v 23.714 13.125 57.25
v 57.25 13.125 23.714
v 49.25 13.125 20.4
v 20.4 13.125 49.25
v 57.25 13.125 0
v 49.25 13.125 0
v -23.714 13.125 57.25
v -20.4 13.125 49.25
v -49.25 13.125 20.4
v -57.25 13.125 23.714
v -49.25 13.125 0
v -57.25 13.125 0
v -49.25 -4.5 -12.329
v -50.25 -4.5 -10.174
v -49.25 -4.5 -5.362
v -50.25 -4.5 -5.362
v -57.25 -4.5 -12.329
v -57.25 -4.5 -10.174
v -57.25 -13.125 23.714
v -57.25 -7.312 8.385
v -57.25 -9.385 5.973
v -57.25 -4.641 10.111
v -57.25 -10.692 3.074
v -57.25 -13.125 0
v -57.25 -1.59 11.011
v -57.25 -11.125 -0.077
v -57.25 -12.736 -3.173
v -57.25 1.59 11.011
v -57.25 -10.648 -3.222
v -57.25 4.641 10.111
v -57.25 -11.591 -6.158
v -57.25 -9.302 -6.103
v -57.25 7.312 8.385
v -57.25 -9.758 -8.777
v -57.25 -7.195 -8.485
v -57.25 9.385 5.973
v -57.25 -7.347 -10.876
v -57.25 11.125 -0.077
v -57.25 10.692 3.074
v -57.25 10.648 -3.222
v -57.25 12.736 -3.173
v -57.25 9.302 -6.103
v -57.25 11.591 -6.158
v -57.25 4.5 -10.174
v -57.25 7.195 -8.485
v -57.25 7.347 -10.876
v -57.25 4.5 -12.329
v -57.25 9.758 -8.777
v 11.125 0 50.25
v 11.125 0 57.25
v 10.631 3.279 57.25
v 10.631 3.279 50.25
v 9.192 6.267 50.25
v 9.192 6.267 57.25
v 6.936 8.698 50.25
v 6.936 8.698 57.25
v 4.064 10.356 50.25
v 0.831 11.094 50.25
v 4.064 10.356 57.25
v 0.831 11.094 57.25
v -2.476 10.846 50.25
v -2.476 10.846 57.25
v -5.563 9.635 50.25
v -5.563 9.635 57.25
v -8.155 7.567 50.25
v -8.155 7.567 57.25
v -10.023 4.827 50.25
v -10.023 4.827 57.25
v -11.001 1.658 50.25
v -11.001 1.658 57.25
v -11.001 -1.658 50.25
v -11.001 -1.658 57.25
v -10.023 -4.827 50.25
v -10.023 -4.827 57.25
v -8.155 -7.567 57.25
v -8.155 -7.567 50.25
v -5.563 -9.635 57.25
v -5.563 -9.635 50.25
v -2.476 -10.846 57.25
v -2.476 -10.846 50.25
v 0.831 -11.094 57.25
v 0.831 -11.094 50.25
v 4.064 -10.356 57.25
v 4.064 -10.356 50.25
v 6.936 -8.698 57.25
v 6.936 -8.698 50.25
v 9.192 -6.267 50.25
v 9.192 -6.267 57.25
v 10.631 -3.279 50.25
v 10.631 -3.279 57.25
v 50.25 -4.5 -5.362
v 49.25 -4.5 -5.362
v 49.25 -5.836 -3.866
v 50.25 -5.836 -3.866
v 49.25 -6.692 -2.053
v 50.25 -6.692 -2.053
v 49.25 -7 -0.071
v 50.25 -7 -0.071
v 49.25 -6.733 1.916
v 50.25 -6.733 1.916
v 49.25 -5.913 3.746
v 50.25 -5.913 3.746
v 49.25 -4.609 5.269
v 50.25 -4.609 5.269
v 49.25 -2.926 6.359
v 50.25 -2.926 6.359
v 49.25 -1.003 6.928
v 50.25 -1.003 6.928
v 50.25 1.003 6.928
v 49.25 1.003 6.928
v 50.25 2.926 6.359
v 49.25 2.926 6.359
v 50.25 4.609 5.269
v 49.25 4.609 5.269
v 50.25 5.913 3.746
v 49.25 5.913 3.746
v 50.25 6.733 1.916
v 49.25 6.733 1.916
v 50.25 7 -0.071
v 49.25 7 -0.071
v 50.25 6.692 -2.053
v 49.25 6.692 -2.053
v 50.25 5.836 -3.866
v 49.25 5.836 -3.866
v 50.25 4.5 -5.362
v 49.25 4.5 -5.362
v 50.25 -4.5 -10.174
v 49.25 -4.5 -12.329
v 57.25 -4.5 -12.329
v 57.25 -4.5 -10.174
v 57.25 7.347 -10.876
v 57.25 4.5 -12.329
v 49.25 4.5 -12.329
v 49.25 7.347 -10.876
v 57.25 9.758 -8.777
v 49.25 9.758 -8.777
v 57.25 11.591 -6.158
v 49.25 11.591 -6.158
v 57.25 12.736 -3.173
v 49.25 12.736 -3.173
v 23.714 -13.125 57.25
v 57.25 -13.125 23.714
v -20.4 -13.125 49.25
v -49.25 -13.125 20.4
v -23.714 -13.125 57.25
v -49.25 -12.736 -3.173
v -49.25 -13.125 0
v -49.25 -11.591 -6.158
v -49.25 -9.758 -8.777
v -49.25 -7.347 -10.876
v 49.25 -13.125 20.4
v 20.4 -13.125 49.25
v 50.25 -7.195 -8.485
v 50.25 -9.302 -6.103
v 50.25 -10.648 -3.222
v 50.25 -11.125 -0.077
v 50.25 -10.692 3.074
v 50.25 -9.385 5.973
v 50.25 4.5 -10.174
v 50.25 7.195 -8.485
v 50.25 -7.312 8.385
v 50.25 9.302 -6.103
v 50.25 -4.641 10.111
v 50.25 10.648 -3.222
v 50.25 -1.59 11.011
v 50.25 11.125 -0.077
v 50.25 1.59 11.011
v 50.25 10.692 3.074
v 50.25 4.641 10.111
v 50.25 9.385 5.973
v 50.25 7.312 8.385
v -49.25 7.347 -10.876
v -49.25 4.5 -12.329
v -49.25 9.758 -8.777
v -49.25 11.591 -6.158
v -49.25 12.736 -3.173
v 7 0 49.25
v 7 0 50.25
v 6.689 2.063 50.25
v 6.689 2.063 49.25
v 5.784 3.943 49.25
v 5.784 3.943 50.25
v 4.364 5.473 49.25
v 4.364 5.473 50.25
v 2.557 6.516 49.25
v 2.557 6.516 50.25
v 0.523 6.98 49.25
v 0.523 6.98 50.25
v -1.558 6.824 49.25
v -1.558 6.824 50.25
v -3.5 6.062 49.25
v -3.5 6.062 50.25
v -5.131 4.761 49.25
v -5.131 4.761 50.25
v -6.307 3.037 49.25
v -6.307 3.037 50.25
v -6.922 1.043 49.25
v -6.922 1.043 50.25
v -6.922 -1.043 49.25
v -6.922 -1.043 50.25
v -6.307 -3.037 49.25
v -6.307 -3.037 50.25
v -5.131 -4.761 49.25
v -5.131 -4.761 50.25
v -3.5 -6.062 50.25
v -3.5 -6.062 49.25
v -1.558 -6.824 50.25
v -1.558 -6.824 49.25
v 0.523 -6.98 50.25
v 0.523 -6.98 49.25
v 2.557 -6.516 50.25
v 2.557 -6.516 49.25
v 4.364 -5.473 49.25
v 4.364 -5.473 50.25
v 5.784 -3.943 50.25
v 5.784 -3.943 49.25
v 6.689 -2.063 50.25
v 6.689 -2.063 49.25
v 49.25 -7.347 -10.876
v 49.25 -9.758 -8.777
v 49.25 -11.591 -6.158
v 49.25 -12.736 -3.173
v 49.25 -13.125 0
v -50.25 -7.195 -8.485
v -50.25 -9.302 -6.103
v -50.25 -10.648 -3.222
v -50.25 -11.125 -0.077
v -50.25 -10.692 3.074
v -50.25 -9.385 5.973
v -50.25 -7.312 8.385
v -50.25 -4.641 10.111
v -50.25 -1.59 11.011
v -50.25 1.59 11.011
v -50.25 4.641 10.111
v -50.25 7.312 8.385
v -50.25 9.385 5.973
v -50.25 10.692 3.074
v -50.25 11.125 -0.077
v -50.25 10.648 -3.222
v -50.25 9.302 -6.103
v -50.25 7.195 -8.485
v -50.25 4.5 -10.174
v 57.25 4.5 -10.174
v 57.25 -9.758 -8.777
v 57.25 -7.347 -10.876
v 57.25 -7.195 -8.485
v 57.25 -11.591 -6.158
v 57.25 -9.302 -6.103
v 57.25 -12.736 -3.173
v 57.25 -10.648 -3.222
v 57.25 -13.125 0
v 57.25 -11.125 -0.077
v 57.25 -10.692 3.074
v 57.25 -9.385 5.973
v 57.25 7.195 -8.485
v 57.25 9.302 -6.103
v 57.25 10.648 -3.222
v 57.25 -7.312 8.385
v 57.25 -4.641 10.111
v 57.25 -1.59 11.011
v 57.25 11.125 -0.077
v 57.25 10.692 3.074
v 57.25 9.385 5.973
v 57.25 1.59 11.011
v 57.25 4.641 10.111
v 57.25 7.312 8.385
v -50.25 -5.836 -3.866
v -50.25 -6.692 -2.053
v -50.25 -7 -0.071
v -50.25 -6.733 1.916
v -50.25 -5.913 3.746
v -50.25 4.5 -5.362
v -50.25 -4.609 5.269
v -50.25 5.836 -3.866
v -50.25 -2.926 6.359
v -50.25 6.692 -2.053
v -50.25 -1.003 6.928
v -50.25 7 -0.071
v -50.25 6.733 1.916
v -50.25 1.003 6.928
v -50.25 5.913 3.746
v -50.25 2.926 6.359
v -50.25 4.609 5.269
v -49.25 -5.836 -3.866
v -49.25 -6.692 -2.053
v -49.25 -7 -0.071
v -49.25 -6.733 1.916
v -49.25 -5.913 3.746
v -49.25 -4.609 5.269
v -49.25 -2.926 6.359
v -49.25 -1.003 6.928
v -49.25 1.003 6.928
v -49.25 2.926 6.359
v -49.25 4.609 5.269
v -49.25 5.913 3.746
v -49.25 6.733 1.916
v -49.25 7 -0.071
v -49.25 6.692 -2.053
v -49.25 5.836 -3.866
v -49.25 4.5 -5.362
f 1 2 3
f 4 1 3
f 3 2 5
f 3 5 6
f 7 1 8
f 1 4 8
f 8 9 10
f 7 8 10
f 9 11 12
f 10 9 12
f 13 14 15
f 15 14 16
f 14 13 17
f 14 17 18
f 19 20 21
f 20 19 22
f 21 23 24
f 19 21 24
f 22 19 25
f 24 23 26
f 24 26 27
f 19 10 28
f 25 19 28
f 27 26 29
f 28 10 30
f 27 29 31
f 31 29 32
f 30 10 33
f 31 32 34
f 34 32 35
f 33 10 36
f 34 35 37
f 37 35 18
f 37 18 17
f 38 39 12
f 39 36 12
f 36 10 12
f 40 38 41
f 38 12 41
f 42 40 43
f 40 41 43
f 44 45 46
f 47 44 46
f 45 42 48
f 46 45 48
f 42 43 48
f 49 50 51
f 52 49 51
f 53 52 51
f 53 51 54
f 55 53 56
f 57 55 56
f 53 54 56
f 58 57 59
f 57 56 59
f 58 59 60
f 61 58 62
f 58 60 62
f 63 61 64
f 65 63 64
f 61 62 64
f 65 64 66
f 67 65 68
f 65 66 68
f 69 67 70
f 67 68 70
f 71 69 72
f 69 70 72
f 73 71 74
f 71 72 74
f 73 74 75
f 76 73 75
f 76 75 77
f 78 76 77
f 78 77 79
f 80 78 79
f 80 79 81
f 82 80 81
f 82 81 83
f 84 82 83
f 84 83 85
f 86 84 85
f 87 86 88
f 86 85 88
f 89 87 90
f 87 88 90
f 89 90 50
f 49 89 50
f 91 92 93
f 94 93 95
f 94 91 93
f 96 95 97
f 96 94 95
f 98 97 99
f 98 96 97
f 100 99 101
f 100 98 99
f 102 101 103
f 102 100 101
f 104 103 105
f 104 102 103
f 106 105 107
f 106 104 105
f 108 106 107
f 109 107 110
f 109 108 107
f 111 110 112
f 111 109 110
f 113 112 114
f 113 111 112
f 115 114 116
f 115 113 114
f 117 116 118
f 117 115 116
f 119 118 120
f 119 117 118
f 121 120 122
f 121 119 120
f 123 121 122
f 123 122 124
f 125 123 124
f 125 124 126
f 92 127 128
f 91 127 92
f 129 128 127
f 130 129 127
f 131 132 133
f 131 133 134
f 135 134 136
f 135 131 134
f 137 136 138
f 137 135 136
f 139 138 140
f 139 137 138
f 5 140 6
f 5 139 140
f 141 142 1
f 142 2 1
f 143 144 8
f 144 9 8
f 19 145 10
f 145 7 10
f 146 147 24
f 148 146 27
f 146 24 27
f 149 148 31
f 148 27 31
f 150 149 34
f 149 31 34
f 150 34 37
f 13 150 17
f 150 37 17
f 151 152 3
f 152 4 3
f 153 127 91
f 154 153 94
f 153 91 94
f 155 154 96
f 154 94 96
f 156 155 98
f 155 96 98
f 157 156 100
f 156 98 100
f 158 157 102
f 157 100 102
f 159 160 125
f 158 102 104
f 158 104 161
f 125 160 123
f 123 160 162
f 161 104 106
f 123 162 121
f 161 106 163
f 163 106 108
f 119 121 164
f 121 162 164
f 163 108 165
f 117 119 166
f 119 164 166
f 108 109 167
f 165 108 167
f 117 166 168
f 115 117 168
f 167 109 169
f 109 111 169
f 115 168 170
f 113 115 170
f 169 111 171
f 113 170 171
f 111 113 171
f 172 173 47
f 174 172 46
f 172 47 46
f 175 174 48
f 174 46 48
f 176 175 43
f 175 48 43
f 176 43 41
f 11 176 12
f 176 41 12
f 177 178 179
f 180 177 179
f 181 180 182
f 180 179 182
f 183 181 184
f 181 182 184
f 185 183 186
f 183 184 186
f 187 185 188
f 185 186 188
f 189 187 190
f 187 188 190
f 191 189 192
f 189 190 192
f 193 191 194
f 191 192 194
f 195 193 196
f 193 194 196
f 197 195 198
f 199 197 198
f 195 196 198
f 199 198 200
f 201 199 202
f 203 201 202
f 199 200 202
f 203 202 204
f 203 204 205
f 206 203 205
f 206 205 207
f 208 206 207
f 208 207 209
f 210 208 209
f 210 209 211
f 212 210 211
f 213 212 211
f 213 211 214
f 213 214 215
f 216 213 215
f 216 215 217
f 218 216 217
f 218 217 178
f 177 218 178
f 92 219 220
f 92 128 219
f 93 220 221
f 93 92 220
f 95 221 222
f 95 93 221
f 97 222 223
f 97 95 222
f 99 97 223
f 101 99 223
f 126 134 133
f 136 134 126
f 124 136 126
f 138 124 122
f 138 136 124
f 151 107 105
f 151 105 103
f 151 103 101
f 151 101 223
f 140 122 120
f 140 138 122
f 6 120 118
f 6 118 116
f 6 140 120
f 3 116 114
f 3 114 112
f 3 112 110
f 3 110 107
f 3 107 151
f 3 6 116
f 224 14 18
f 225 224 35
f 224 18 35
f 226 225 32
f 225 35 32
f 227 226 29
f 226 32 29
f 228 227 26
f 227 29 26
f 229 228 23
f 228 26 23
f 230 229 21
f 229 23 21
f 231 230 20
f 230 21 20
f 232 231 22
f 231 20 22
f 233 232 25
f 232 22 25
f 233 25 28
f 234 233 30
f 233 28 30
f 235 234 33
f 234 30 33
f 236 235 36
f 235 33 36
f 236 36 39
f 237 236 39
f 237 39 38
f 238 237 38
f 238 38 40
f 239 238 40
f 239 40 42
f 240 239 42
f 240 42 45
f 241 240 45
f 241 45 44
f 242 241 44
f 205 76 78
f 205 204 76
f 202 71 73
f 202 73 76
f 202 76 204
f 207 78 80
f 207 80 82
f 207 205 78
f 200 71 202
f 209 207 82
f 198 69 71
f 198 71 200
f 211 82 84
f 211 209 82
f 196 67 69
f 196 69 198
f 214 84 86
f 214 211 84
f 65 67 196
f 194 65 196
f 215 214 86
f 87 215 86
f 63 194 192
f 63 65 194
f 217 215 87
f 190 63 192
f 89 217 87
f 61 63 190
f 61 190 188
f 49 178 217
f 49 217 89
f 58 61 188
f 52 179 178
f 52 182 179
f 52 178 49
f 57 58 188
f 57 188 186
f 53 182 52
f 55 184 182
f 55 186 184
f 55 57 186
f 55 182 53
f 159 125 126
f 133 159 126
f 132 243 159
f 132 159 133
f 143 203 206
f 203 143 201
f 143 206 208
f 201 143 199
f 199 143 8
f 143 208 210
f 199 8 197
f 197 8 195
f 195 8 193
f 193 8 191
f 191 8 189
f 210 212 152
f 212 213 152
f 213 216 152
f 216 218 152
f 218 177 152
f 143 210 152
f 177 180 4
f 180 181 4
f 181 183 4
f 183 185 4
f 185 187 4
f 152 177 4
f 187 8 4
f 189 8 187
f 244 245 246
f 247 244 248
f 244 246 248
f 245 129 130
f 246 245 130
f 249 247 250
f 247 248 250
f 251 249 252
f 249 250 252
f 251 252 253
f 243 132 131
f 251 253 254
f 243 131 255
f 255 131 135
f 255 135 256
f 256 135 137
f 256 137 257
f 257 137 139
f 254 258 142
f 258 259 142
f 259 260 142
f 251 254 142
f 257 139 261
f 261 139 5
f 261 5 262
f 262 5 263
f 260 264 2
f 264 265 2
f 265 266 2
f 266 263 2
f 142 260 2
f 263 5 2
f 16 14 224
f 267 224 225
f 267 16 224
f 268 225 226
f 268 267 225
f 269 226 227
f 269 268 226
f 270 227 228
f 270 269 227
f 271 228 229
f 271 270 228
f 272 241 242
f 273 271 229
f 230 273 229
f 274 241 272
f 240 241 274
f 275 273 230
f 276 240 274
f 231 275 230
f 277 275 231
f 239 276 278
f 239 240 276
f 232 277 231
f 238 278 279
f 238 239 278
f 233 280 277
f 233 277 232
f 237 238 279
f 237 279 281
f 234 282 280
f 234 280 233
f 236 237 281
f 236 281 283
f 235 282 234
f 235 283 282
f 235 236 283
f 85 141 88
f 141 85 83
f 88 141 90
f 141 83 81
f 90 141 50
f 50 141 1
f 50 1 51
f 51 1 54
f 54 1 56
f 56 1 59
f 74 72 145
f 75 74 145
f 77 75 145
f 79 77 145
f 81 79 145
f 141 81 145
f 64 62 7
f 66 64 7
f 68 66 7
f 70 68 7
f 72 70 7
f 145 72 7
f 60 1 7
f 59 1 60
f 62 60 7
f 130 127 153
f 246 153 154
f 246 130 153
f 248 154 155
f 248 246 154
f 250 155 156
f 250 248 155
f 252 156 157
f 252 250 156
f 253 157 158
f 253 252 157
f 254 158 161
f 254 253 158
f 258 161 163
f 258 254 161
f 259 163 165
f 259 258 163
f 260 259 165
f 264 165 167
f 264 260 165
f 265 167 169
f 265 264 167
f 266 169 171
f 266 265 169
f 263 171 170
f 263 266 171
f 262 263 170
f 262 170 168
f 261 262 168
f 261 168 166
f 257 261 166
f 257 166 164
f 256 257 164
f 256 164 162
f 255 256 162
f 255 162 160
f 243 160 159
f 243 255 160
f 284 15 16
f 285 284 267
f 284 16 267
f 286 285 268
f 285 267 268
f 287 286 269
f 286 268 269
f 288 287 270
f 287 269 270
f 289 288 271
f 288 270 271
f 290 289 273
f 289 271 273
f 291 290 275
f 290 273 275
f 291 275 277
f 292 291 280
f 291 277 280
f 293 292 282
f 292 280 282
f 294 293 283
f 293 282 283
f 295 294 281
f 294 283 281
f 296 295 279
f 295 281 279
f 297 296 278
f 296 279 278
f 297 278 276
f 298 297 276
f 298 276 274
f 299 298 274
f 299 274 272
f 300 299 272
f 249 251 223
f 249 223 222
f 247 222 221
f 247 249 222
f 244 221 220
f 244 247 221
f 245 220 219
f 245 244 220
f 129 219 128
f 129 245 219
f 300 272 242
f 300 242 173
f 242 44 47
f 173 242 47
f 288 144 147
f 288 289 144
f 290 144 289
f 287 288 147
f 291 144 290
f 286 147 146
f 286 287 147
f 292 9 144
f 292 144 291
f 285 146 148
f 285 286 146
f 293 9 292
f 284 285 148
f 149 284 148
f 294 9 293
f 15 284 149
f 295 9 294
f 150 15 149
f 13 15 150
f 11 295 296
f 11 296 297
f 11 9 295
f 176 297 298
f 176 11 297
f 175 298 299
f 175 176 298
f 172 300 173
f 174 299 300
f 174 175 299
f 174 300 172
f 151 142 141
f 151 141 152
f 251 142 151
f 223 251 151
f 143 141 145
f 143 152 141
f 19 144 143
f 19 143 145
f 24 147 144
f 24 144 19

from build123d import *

# Parameters (mm, degrees)
BOSS_EXTRUDE1_DEPTH = 13.125
CUT_EXTRUDE1_REACH  = 130.686
CUT_EXTRUDE2_DEPTH  = 7
SKETCH3_R           = 11.125
CUT_EXTRUDE3_DEPTH  = 7
CUT_EXTRUDE4_REACH  = 87.826
SKETCH4_R           = 7


with BuildPart() as part:
    # Sketch1 → Boss-Extrude1 (new, symmetric)
    with BuildSketch(Plane(origin=(0, 0, 0), x_dir=(1, 0, 0), z_dir=(0, 1, 0))):
        Polygon((-49.25, 13.125), (-49.25, -13.125), (-49.25, -20.400017947), (-20.400017947, -49.25), (20.400017947, -49.25), (49.25, -20.400017947), (49.25, -13.125), (49.25, 13.125), (57.25, 13.125), (57.25, -23.713726446), (23.713726446, -57.25), (-23.713726446, -57.25), (-57.25, -23.713726446), (-57.25, 13.125), align=None)
    extrude(amount=BOSS_EXTRUDE1_DEPTH, both=True)

    # Sketch2 → Cut-Extrude1 (cut, up to next)
    with BuildSketch(Plane.ZY.offset(57.25), mode=Mode.PRIVATE) as cut_extrude1_sk1:
        with BuildLine():
            ThreePointArc((-5.361902647, -4.5), (7, 0), (-5.361902647, 4.5))
            Line((-5.361902647, 4.5), (-12.329461667, 4.5))
            ThreePointArc((-12.329461667, 4.5), (-7.523400993, 10.7547228), (0, 13.125))
            Line((0, 13.125), (-13.125, 13.125))
            Line((-13.125, 13.125), (-13.125, -13.125))
            Line((-13.125, -13.125), (0, -13.125))
            ThreePointArc((0, -13.125), (-7.523400993, -10.7547228), (-12.329461667, -4.5))
            Line((-12.329461667, -4.5), (-5.361902647, -4.5))
        make_face()
    cut_extrude1_tool1 = extrude(cut_extrude1_sk1.sketch, amount=-CUT_EXTRUDE1_REACH, mode=Mode.PRIVATE) & part.part
    cut_extrude1 = cut_extrude1_tool1.solids().sort_by_distance((-57.25, 0, -4.585873))[0]
    add(cut_extrude1, mode=Mode.SUBTRACT)

    # Sketch2<4> → Cut-Extrude2 (cut)
    with BuildSketch(Plane.ZY.offset(57.25)):
        with BuildLine():
            Line((-10.174262873, 4.5), (-5.361902647, 4.5))
            ThreePointArc((-5.361902647, 4.5), (2.394439545, 6.577739678), (7, 0))
            ThreePointArc((7, 0), (2.394439545, -6.577739678), (-5.361902647, -4.5))
            Line((-5.361902647, -4.5), (-10.174262873, -4.5))
            ThreePointArc((-10.174262873, -4.5), (2.299668513, -10.88472093), (11.125, 0))
            ThreePointArc((11.125, 0), (2.299668513, 10.88472093), (-10.174262873, 4.5))
        make_face()
    cut_extrude2 = extrude(amount=-CUT_EXTRUDE2_DEPTH, mode=Mode.SUBTRACT)

    # Mirror1: Cut-Extrude1, Cut-Extrude2 across plane
    add(cut_extrude1.mirror(Plane(origin=(0, 0, 0), x_dir=(0, 0, 1), z_dir=(1, 0, 0))), mode=Mode.SUBTRACT)
    add(cut_extrude2.mirror(Plane(origin=(0, 0, 0), x_dir=(0, 0, 1), z_dir=(1, 0, 0))), mode=Mode.SUBTRACT)

    # Sketch3 → Cut-Extrude3 (cut)
    with BuildSketch(Plane.XY.offset(57.25)):
        Circle(SKETCH3_R)
    extrude(amount=-CUT_EXTRUDE3_DEPTH, mode=Mode.SUBTRACT)

    # Sketch4 → Cut-Extrude4 (cut, up to next)
    with BuildSketch(Plane.XY.offset(50.25), mode=Mode.PRIVATE) as cut_extrude4_sk1:
        Circle(SKETCH4_R)
    cut_extrude4_tool1 = extrude(cut_extrude4_sk1.sketch, amount=-CUT_EXTRUDE4_REACH, mode=Mode.PRIVATE) & part.part
    add(cut_extrude4_tool1.solids().sort_by_distance((0, 0, 50.25))[0], mode=Mode.SUBTRACT)


solid = part.part
